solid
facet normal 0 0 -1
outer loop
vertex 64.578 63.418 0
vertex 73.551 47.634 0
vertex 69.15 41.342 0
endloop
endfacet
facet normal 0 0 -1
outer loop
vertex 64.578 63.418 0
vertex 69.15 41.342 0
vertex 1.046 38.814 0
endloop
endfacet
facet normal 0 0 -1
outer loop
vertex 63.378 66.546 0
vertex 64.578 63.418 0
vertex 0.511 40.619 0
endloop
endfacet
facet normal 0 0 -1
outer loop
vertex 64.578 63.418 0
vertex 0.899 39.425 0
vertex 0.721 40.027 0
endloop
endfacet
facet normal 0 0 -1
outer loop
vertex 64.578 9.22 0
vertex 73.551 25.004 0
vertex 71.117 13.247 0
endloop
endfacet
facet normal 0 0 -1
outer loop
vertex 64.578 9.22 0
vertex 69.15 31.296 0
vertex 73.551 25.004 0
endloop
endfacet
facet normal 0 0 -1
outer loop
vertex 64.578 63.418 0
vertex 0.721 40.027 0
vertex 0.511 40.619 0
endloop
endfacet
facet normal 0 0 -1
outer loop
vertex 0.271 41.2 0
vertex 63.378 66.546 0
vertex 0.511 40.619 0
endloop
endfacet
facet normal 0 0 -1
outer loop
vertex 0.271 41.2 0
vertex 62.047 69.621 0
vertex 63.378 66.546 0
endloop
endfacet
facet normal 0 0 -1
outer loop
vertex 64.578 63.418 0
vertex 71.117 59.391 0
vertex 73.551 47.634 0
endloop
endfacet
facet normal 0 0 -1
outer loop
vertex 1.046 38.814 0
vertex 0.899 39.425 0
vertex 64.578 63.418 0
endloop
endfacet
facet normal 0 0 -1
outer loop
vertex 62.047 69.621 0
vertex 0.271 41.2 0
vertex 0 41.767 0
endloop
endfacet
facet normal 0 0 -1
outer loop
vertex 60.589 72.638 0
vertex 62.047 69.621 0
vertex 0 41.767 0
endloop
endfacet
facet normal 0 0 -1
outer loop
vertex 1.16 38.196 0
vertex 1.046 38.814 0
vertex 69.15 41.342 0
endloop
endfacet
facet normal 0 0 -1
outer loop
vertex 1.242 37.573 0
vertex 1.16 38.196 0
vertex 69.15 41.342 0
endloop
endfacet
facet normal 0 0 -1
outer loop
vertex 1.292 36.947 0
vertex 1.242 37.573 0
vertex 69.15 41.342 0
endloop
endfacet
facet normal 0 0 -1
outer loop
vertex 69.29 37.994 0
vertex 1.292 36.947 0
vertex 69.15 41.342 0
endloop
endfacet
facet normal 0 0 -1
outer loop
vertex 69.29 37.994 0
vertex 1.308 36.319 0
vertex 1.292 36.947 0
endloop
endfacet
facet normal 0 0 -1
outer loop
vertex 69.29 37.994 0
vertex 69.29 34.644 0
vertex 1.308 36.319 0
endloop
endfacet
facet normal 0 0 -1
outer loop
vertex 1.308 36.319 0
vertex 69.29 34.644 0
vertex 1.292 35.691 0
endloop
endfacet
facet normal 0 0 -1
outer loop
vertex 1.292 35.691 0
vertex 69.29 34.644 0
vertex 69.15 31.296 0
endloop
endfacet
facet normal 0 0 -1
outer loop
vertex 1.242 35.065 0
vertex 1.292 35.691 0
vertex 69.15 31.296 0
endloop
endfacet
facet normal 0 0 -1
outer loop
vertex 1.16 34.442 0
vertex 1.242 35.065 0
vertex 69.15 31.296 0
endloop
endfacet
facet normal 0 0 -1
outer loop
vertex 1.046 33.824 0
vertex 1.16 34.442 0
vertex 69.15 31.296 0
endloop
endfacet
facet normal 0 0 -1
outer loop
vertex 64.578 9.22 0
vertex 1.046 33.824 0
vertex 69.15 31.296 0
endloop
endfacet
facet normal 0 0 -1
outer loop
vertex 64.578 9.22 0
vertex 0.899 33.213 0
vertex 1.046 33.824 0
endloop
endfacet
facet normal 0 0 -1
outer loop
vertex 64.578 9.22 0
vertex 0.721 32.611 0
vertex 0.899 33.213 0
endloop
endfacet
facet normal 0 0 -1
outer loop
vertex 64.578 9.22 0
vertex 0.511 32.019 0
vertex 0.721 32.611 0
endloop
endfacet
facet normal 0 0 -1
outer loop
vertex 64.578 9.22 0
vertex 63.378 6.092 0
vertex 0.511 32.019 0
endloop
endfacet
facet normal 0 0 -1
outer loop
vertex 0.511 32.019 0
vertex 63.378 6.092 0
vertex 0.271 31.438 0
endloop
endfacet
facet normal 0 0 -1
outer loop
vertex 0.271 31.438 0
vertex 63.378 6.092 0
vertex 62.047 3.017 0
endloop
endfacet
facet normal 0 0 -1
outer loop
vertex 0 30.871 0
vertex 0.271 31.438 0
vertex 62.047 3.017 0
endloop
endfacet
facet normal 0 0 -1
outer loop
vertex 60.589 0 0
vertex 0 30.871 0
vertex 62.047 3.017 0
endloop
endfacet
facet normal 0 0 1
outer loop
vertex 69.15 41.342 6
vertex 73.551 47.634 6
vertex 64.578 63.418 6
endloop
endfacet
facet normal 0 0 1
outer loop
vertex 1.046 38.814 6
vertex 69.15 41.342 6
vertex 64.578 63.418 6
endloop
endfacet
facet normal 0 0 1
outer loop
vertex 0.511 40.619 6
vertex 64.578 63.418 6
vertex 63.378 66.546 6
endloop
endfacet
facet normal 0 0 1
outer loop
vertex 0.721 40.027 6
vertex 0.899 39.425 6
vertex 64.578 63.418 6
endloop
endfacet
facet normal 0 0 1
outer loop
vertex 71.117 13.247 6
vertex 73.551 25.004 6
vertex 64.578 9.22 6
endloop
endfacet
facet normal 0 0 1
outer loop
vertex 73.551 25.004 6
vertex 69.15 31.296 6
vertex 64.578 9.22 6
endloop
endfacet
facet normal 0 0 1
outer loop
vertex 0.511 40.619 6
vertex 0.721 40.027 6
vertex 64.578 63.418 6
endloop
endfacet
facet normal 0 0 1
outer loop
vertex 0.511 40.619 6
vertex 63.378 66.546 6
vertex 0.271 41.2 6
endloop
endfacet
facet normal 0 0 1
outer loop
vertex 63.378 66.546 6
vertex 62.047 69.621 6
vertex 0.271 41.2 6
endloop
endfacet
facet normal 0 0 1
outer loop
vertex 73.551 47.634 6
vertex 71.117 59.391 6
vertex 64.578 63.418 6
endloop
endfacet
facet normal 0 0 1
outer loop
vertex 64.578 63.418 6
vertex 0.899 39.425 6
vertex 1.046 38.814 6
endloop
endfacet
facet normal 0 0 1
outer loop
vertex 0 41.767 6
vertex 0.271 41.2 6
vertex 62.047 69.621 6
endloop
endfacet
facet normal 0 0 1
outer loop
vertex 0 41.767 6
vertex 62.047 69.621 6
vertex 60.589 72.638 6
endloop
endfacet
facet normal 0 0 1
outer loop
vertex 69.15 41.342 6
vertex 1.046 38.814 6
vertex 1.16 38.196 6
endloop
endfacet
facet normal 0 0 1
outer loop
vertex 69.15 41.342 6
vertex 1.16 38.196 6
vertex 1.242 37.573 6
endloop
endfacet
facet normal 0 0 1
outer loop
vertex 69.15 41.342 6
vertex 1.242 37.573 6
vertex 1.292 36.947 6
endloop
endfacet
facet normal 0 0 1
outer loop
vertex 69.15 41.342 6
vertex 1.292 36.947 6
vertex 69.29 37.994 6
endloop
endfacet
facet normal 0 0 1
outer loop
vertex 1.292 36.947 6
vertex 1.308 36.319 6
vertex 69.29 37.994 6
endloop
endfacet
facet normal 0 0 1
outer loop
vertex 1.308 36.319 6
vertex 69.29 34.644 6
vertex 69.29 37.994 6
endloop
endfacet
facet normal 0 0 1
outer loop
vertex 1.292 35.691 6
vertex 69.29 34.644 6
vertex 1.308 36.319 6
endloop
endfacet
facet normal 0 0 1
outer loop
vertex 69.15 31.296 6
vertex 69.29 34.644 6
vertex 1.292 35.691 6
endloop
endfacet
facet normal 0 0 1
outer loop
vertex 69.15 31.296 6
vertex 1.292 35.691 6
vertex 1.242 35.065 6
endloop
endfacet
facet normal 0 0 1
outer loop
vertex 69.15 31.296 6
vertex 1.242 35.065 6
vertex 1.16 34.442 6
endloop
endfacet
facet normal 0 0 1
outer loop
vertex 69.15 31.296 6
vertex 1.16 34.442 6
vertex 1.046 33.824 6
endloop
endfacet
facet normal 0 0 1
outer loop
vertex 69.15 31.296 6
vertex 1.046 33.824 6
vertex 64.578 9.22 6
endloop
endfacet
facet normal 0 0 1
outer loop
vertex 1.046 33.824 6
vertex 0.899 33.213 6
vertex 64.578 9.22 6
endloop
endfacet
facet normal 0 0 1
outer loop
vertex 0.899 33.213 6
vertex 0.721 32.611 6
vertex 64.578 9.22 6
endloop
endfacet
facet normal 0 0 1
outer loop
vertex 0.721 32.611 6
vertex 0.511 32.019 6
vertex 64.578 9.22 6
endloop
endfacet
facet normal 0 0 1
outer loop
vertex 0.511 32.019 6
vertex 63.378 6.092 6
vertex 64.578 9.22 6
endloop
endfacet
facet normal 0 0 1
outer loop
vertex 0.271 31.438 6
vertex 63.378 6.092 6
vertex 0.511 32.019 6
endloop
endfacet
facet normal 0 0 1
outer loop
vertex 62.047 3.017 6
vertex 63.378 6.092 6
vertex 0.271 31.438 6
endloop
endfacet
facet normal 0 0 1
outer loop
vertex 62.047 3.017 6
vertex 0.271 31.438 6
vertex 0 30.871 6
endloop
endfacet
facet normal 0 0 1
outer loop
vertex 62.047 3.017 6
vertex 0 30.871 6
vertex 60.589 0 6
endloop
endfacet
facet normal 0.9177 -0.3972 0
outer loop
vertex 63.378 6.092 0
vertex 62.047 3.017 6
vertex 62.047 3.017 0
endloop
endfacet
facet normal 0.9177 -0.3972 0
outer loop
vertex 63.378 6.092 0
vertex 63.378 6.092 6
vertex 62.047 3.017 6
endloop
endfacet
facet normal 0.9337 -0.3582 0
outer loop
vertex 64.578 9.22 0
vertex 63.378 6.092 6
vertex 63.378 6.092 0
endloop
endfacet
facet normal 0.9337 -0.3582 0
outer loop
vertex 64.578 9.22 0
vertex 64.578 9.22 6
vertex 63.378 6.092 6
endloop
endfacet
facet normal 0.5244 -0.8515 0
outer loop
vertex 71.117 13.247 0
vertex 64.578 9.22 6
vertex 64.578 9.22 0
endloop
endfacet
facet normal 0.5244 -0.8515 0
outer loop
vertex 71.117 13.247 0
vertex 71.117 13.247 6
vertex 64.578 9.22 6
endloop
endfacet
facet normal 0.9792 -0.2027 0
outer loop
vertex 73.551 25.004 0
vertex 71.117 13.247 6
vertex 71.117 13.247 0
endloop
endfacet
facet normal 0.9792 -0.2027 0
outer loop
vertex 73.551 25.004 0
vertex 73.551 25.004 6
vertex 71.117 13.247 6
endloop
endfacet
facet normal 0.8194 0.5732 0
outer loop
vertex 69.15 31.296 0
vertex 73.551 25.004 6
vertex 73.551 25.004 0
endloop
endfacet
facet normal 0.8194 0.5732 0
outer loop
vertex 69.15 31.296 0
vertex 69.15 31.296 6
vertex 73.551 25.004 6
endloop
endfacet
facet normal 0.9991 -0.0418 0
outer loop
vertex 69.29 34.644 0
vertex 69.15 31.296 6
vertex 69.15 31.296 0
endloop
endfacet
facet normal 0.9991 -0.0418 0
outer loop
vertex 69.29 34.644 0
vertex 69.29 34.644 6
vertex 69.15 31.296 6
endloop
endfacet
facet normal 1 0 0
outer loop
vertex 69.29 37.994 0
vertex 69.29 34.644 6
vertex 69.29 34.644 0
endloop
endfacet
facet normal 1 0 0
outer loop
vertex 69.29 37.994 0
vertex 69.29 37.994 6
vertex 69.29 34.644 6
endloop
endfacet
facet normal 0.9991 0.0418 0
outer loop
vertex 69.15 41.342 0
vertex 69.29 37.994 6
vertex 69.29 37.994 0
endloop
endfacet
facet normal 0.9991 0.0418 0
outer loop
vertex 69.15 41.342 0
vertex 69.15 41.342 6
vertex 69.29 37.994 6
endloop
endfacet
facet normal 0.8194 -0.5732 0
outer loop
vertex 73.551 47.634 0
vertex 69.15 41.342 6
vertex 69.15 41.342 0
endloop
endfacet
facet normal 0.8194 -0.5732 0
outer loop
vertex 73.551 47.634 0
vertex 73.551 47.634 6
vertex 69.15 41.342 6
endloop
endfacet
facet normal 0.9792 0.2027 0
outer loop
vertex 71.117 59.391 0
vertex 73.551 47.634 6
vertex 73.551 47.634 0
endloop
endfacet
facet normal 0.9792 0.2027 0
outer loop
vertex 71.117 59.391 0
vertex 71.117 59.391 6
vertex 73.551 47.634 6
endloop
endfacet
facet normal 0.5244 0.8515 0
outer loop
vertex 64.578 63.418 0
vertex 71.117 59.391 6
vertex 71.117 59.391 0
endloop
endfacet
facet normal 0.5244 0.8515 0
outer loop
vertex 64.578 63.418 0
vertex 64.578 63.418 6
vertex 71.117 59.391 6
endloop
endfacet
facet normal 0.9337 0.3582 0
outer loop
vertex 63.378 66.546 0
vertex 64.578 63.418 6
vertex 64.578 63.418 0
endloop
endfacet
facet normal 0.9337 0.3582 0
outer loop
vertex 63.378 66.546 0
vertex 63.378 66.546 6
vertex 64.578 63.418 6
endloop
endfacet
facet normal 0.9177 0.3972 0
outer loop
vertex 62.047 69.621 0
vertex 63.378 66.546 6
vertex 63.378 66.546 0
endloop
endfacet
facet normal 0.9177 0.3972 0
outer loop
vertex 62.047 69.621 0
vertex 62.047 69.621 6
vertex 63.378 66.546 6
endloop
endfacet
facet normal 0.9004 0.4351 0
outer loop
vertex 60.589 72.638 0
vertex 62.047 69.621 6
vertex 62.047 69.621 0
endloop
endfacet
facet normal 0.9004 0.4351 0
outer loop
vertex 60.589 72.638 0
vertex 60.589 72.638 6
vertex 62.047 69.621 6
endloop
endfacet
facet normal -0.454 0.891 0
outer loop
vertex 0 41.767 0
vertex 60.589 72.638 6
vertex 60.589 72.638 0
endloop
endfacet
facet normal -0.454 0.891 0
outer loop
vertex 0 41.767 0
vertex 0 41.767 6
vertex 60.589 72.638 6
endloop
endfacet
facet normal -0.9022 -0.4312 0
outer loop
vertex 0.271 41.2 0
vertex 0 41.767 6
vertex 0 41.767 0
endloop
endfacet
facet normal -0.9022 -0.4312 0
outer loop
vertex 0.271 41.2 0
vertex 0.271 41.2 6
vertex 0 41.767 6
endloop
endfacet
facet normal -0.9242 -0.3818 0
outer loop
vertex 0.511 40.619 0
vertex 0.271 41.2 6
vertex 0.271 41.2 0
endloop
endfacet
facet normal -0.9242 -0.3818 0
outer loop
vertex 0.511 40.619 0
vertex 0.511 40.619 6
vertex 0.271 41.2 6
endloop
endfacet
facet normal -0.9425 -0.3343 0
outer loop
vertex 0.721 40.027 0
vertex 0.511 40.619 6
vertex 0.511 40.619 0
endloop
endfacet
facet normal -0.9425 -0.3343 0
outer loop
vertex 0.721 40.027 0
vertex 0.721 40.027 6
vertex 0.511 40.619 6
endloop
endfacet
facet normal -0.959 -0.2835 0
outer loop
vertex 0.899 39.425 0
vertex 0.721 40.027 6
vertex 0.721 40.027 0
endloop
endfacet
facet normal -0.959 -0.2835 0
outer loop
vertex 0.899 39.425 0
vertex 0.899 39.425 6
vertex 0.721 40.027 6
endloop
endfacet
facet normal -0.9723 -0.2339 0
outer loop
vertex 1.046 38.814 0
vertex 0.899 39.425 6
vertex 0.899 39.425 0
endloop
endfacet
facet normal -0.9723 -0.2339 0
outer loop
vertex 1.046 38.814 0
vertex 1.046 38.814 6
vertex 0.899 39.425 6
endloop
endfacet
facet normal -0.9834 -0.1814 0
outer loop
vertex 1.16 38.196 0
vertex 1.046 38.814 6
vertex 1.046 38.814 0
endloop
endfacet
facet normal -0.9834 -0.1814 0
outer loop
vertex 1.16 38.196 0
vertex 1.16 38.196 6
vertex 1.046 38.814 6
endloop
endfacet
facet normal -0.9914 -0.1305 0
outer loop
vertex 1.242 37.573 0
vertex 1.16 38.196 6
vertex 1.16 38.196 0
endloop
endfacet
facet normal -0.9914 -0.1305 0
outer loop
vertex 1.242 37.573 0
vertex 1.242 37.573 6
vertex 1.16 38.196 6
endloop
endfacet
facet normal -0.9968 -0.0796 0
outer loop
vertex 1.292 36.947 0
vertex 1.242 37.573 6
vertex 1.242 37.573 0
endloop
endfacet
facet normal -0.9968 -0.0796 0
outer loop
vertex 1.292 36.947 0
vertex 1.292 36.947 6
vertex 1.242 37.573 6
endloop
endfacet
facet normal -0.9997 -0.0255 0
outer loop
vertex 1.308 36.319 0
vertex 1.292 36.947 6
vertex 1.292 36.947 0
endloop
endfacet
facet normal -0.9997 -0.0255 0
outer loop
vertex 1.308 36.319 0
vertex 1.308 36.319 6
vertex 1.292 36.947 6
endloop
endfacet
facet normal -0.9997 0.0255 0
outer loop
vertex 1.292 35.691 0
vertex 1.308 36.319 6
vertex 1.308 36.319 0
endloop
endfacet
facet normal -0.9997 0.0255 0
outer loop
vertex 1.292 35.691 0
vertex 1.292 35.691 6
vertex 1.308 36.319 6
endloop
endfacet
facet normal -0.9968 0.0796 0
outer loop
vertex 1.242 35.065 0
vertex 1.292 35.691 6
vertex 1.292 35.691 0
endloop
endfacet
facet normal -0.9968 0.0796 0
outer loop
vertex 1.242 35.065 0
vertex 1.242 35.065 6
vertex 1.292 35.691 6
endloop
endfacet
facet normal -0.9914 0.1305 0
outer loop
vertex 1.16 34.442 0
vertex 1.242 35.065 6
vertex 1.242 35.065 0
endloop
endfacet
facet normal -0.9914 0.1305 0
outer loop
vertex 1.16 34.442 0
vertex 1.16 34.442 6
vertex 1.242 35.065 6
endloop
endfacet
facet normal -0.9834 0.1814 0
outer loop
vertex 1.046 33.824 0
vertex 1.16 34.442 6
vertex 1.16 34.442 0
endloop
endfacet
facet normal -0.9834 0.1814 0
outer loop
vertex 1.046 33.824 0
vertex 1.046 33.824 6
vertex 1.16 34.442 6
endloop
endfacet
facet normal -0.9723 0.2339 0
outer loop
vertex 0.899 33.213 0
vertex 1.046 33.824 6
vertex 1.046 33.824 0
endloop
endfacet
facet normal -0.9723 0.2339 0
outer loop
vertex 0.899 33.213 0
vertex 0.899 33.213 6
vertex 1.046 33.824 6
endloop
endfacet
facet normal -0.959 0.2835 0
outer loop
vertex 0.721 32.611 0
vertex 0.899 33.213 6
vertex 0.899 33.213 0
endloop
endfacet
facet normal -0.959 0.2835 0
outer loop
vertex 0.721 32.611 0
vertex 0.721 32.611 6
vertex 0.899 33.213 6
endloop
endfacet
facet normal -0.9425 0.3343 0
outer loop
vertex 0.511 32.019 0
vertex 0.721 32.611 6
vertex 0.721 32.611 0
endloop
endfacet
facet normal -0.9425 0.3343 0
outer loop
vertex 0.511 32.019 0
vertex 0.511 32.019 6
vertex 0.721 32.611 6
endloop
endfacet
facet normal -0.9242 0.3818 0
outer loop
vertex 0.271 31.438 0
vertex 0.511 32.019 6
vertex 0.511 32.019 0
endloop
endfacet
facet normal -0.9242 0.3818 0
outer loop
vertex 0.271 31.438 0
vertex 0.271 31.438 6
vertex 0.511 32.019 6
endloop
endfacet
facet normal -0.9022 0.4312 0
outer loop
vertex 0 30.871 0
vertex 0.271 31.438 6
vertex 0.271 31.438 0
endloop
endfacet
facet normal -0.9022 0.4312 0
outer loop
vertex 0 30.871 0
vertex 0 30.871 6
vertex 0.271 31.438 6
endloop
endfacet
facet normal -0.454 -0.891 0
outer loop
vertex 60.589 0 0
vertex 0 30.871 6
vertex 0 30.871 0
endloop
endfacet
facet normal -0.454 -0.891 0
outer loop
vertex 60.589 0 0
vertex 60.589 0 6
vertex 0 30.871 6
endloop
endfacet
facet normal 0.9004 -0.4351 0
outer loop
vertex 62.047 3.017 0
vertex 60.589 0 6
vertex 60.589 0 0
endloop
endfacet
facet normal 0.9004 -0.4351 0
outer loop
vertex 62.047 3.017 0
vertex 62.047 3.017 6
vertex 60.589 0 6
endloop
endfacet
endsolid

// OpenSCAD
$fn = 32;

// ----------------------------------------------------------------------
// Gear sector: 2 teeth on 54 degrees
// ----------------------------------------------------------------------

// --- parameters (mm) ---
sector_angle = 54;        // sector angle, degrees
root_r = 80;              // root circle radius
tooth_h = 5;              // tooth height over the root circle
teeth = 2;                // number of teeth on the sector
hub_r = 12;               // hub bore radius
plate_t = 6;              // sector thickness, Z
arc_step = 3;             // sampling step of the root/hub arcs, degrees

tip_r = root_r + tooth_h;  // tip circle radius

profile = [[60.589, 0], [62.047, 3.017], [63.378, 6.092], [64.578, 9.22], [71.117, 13.247], [73.551, 25.004], [69.15, 31.296], [69.29, 34.644], [69.29, 37.994], [69.15, 41.342], [73.551, 47.634], [71.117, 59.391], [64.578, 63.418], [63.378, 66.546], [62.047, 69.621], [60.589, 72.638], [0, 41.767], [0.271, 41.2], [0.511, 40.619], [0.721, 40.027], [0.899, 39.425], [1.046, 38.814], [1.16, 38.196], [1.242, 37.573], [1.292, 36.947], [1.308, 36.319], [1.292, 35.691], [1.242, 35.065], [1.16, 34.442], [1.046, 33.824], [0.899, 33.213], [0.721, 32.611], [0.511, 32.019], [0.271, 31.438], [0, 30.871]];  // primary outline, 35 points, counter clockwise

// --- the one profile operation ---
linear_extrude(height = plate_t) polygon(points = profile);
